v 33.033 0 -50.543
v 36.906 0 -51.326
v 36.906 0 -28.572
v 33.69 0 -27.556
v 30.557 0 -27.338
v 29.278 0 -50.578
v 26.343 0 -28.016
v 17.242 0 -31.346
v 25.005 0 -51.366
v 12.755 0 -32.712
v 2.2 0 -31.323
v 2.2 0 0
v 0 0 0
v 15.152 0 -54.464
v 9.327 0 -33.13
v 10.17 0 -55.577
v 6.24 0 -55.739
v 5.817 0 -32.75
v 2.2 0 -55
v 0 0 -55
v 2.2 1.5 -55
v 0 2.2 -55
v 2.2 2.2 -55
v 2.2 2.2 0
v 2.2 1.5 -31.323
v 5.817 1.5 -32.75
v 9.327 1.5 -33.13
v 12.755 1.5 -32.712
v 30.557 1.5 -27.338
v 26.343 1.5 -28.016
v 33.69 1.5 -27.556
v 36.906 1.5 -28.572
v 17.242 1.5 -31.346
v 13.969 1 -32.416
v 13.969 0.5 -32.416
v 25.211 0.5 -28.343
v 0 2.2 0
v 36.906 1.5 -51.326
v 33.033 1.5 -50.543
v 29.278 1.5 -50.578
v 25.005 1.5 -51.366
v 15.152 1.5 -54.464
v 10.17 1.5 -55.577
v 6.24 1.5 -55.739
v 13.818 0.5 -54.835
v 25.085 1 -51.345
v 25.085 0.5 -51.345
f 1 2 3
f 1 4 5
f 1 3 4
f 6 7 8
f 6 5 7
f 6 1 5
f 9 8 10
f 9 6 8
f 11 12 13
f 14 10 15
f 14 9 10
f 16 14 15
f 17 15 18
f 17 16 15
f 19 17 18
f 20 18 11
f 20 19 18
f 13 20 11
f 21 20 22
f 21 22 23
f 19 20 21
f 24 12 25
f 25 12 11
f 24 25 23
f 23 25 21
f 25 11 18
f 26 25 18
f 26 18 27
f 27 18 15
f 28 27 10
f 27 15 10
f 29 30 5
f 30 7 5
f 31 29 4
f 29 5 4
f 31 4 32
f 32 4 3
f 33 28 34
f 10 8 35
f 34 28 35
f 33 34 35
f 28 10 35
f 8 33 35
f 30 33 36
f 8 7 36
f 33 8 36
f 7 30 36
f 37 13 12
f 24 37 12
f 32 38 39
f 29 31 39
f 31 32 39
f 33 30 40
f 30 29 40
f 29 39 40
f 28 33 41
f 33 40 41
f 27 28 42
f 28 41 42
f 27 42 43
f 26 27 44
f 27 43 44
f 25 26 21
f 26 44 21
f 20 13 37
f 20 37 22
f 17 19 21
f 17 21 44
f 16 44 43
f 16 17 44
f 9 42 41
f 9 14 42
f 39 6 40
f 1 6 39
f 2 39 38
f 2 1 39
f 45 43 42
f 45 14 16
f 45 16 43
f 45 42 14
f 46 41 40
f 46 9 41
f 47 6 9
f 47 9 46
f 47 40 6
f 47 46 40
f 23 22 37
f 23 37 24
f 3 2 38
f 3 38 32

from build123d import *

# Parameters (mm, degrees)
SKETCH1_W           = 2.2
SKETCH1_H           = 55
BOSS_EXTRUDE1_DEPTH = 2.2
BOSS_EXTRUDE2_DEPTH = 1.5


with BuildPart() as part:
    # Sketch1 → Boss-Extrude1 (new body)
    with BuildSketch(Plane(origin=(0, 0, 0), x_dir=(1, 0, 0), z_dir=(0, 1, 0))):
        with Locations((1.1, 27.5)):
            Rectangle(SKETCH1_W, SKETCH1_H)
    extrude(amount=BOSS_EXTRUDE1_DEPTH)

    # Sketch2 → Boss-Extrude2 (add)
    with BuildSketch(Plane(origin=(0, 0, 0), x_dir=(1, 0, 0), z_dir=(0, 1, 0))):
        with BuildLine():
            Line((36.906195037, 51.326121053), (36.906195037, 28.571653378))
            add(Edge.make_bspline(
                [(2.2, 31.323116725), (14.559505751, 38.154017268), (24.656914199, 23.036255891), (36.906195037, 28.571653378)],
                knots=[0, 0, 0, 0, 1, 1, 1, 1], degree=3))
            Line((2.2, 31.323116725), (2.2, 55))
            add(Edge.make_bspline(
                [(2.2, 55), (14.296538577, 58.763817037), (24.50579778, 47.343941309), (36.906195037, 51.326121053)],
                knots=[0, 0, 0, 0, 1, 1, 1, 1], degree=3))
        make_face()
    extrude(amount=BOSS_EXTRUDE2_DEPTH)


solid = part.part
